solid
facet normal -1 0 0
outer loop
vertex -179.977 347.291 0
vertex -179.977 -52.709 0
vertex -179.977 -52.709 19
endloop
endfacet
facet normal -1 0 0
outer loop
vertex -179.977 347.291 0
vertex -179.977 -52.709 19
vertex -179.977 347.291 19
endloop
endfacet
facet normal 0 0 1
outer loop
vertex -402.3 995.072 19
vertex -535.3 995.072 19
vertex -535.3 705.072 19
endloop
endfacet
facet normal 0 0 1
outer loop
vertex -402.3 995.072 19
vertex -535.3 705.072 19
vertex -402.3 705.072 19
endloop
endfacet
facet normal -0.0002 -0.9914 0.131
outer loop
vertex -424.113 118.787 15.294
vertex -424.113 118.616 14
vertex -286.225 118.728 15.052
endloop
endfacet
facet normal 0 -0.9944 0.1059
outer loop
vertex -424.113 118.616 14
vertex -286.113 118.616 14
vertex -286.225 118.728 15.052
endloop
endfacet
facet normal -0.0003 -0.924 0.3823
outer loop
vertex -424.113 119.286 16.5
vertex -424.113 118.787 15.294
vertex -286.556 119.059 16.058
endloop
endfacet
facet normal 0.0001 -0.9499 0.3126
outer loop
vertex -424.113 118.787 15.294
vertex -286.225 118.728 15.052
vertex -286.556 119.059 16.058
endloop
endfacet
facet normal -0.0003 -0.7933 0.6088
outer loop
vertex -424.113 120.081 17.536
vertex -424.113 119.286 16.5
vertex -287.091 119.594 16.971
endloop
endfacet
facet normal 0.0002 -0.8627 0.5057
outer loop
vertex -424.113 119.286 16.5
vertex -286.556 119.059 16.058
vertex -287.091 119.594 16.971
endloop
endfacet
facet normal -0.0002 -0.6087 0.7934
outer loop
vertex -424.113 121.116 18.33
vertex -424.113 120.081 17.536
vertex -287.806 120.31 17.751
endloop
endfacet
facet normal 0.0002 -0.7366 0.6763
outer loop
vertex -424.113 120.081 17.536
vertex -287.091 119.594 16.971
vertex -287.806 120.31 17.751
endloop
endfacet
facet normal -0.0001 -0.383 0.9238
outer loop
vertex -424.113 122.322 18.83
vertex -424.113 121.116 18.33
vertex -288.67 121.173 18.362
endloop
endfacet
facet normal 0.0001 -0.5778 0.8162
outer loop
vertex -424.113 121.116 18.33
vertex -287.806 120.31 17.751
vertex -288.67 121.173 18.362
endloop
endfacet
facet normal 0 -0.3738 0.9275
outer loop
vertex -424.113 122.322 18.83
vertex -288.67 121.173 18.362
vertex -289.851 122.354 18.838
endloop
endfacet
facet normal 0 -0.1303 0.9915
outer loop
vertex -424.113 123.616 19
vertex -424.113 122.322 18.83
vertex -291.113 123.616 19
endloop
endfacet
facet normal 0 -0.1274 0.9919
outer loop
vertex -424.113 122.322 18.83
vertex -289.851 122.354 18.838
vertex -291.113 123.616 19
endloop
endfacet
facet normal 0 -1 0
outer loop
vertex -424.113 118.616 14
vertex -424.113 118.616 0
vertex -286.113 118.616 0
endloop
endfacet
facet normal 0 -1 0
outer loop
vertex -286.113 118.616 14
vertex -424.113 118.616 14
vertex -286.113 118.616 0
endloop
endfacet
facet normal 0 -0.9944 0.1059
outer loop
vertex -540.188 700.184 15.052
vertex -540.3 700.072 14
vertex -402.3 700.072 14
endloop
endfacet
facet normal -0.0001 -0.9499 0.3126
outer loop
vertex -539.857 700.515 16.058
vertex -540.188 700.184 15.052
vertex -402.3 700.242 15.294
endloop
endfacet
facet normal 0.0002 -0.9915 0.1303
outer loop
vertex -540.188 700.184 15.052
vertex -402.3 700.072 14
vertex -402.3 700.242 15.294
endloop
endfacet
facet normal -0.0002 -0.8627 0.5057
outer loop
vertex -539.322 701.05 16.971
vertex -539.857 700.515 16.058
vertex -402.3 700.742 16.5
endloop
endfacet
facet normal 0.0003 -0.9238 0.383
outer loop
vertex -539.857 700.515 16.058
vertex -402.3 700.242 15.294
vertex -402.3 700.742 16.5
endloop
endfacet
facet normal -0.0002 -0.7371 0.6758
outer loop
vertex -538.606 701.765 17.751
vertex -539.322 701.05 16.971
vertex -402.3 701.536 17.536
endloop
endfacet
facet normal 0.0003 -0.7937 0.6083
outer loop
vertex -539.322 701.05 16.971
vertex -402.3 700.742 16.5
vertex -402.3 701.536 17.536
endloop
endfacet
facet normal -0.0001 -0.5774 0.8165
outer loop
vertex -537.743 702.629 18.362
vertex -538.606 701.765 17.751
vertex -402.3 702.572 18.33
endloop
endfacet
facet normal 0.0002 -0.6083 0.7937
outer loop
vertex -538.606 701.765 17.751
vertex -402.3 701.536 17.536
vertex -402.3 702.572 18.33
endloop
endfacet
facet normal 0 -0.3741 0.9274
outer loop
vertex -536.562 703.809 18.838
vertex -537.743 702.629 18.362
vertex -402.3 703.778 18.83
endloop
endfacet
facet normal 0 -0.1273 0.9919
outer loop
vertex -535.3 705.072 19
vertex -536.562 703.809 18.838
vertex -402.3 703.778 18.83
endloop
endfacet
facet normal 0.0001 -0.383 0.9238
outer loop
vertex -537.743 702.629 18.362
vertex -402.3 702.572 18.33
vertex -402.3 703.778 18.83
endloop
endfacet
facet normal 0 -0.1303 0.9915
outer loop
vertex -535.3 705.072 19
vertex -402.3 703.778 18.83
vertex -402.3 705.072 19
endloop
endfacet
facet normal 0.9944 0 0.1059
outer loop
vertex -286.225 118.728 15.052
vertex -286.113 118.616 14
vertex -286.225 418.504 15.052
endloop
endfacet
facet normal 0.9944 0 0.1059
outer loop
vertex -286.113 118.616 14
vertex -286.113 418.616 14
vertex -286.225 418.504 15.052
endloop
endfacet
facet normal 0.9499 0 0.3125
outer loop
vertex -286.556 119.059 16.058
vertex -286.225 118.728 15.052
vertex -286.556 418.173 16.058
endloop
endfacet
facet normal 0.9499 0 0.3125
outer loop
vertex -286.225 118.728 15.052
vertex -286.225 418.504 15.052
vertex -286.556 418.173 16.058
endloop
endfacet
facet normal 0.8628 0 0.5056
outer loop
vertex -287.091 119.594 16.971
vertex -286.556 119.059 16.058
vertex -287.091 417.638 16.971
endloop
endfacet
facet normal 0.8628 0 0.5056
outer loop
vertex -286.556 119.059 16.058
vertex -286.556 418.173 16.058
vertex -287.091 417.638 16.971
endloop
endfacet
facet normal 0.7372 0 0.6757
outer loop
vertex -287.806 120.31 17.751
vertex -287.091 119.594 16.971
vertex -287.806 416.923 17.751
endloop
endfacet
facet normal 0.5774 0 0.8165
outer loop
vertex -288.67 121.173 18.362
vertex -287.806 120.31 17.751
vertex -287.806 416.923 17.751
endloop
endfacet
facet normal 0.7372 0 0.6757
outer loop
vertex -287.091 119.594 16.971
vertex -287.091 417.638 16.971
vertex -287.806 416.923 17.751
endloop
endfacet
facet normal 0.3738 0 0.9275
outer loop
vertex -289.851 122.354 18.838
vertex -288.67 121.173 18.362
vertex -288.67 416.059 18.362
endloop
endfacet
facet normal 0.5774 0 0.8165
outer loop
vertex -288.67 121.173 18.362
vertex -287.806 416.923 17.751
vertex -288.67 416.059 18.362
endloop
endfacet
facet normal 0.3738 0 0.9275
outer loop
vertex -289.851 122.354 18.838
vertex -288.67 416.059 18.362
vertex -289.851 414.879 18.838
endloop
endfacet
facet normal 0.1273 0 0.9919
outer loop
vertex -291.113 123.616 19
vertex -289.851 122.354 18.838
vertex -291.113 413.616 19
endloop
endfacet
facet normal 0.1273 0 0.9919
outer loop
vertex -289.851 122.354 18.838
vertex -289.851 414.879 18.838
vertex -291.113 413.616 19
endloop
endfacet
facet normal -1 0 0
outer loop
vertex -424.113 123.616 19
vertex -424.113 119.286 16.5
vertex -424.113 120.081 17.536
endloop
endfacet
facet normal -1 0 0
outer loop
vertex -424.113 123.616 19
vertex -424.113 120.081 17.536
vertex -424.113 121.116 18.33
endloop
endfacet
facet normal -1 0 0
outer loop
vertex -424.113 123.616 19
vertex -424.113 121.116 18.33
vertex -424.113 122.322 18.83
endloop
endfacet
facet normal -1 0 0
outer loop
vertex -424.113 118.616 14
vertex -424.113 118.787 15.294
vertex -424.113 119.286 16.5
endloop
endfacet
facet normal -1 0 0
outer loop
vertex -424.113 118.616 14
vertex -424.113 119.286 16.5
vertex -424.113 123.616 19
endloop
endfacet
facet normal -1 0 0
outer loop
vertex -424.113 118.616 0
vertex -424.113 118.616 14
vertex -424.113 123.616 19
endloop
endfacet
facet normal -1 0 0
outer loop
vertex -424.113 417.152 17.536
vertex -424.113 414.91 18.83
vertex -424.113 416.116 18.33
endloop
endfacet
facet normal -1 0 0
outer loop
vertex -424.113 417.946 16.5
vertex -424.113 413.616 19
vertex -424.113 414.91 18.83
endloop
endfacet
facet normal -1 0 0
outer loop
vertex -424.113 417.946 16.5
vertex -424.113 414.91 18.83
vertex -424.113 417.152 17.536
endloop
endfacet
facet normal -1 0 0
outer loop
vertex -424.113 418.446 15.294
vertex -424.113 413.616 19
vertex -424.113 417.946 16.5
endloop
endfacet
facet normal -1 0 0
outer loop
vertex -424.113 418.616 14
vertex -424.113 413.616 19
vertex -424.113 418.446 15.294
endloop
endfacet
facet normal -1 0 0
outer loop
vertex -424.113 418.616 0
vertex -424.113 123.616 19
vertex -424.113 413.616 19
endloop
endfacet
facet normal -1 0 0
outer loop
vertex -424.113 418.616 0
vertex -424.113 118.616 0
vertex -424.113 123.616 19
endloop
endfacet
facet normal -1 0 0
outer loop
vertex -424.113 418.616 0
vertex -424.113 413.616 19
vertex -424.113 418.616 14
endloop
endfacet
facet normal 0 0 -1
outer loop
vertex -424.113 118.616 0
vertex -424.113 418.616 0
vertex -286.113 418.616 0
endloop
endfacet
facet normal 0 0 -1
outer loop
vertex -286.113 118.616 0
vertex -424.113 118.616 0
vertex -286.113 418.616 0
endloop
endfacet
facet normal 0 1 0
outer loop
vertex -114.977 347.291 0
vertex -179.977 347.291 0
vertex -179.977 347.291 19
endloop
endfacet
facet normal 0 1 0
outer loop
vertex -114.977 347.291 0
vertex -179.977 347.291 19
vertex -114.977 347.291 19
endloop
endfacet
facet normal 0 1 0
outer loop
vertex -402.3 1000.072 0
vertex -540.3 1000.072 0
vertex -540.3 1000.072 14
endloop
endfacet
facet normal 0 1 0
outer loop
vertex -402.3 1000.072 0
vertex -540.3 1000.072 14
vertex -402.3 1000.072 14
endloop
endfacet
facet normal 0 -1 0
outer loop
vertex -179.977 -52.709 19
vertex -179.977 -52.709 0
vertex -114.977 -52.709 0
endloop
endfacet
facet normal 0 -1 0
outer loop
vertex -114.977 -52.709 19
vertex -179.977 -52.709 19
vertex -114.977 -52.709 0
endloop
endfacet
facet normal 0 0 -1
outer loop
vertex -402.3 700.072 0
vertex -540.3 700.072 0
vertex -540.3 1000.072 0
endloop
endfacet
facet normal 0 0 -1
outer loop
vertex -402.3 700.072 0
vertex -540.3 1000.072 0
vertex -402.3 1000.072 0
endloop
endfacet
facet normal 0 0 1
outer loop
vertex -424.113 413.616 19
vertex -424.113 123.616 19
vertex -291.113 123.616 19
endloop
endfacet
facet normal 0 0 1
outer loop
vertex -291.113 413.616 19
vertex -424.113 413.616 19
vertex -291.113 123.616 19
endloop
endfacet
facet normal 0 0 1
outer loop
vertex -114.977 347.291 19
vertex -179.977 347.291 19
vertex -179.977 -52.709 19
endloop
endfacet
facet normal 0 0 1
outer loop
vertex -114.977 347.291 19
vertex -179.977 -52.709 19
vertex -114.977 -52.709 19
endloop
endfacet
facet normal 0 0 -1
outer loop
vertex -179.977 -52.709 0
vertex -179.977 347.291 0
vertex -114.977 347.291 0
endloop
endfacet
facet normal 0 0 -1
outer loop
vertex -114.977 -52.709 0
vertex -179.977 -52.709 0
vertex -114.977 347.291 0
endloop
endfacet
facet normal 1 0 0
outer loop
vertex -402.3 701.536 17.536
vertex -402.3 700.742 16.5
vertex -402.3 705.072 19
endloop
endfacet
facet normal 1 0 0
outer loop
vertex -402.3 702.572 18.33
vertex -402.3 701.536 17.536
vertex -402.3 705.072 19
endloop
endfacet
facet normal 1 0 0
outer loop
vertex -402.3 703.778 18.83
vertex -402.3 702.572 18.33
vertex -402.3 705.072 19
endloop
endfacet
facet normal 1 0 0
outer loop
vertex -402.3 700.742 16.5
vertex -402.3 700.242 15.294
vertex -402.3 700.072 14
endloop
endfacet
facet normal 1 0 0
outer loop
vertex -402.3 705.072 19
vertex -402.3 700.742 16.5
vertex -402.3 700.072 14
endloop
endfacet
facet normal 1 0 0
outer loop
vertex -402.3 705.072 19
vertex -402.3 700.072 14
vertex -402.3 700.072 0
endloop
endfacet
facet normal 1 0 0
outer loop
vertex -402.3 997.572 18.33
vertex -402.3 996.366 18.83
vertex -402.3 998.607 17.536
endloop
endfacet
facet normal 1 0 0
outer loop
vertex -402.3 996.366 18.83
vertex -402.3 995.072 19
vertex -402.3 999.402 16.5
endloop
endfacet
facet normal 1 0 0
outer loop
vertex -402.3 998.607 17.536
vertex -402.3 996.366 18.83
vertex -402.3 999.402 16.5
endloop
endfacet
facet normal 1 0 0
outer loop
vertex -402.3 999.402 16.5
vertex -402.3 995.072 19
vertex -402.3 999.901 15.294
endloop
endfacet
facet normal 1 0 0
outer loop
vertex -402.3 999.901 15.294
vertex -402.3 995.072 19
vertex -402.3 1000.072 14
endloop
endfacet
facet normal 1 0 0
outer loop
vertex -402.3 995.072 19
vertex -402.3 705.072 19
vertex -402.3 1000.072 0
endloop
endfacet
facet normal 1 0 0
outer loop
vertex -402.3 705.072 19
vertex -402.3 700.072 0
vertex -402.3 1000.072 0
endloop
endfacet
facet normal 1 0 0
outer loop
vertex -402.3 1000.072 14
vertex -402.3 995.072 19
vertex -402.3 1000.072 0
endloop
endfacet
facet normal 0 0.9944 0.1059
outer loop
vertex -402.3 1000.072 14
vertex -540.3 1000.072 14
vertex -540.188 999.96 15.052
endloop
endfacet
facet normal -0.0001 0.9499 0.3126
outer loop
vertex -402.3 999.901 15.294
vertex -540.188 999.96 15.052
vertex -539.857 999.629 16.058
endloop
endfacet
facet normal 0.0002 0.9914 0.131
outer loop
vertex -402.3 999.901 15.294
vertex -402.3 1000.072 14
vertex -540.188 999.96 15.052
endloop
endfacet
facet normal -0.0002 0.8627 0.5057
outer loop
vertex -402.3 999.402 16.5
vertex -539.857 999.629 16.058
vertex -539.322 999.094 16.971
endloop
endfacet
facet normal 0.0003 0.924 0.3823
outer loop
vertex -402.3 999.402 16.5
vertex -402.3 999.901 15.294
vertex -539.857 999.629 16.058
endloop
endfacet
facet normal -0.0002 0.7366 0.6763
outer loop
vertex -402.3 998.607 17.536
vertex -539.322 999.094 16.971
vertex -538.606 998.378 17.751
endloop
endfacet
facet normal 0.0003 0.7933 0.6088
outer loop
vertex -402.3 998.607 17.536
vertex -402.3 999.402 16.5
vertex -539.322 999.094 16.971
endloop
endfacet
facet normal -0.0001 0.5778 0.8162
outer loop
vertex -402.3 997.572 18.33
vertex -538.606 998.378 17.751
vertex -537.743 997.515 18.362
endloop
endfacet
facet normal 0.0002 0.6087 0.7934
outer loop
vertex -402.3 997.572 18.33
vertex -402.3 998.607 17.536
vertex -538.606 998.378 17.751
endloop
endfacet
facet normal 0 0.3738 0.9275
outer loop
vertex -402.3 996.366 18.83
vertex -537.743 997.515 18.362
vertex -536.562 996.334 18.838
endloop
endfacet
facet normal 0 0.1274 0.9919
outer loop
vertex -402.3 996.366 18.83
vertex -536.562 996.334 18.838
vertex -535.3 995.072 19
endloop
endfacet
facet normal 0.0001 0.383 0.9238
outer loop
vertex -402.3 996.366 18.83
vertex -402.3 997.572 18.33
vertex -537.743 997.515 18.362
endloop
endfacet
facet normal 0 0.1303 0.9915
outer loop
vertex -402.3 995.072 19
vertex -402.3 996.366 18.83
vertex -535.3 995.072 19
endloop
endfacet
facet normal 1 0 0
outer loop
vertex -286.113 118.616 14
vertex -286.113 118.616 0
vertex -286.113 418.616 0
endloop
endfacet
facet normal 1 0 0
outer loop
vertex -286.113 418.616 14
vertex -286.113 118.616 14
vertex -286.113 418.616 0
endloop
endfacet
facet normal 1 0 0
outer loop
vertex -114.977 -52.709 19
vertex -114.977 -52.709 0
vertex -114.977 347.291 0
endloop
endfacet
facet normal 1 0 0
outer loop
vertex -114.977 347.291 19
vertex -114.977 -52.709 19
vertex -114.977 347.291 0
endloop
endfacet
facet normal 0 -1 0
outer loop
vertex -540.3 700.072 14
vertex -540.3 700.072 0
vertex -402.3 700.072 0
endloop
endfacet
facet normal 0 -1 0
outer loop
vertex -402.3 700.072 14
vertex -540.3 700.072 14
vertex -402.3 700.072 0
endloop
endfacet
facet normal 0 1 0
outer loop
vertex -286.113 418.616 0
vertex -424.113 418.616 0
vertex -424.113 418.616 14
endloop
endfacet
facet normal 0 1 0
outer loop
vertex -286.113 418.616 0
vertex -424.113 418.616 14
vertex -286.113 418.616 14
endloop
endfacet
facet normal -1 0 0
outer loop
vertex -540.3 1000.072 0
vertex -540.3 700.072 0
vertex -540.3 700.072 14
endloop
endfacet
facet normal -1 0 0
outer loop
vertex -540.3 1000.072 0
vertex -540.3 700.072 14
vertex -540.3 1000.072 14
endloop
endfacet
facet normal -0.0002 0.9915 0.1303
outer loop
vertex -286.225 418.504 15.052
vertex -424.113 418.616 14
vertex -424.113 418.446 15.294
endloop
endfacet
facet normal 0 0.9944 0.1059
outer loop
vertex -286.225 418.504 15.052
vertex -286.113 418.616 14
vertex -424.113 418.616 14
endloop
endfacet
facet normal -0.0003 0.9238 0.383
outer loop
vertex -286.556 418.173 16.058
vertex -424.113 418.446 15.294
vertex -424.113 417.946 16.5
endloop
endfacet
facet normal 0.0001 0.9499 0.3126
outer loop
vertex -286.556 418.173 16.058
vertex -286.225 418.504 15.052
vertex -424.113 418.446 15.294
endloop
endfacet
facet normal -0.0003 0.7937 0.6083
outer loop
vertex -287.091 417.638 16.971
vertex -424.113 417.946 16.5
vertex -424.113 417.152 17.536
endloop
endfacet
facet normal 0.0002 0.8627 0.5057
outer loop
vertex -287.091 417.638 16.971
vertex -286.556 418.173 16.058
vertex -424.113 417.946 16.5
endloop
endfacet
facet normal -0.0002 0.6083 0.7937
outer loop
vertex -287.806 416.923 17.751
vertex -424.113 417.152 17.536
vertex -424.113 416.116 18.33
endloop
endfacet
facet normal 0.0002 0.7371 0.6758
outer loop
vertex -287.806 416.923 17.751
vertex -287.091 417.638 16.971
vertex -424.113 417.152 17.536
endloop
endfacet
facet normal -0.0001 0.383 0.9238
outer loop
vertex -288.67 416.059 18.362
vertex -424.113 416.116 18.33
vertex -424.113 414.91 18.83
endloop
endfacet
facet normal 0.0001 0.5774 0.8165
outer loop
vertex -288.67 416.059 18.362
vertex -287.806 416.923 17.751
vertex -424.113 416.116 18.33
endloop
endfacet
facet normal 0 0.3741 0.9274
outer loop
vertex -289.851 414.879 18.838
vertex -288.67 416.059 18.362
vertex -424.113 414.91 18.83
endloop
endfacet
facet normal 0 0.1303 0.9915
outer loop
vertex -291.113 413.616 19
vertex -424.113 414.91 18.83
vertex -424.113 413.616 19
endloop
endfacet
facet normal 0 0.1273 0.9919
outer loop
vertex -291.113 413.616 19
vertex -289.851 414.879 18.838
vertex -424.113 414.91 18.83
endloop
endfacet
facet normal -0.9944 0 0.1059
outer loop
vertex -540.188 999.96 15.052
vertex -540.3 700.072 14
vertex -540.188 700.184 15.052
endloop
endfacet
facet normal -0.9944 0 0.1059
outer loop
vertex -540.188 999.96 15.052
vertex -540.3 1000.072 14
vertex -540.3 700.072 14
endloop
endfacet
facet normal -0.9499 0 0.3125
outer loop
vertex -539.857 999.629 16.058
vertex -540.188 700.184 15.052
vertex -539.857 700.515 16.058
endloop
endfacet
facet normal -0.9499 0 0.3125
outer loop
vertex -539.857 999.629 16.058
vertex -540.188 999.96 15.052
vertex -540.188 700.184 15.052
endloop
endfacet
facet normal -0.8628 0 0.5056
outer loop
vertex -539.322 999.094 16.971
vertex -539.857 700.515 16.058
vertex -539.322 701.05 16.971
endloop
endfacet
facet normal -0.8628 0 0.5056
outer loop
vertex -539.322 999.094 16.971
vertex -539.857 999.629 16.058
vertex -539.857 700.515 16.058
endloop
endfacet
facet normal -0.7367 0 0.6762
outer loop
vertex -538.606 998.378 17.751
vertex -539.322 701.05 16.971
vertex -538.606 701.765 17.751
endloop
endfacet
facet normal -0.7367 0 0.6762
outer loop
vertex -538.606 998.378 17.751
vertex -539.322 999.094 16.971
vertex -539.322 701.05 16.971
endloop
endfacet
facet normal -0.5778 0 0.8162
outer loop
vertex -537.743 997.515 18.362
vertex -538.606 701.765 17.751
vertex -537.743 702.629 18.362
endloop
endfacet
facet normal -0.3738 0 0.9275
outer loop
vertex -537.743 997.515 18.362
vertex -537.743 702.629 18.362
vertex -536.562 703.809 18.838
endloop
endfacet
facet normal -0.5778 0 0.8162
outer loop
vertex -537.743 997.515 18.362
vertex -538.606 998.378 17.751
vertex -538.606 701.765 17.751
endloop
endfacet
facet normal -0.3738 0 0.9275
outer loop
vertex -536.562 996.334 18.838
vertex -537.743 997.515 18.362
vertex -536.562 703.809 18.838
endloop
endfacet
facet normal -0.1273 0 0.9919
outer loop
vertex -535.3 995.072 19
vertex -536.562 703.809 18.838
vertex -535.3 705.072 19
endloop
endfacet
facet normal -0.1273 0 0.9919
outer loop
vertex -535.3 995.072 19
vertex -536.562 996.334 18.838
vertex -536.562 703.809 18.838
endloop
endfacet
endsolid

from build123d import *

# Parameters (mm, degrees)
F0_W     = 65
F0_H     = 400
F1_DEPTH = 19
F2_W     = 138
F2_H     = 300
F3_DEPTH = 19
F4_W     = 138
F4_H     = 300
F5_DEPTH = 19
F6_R     = 5
F6_2_R   = 5


with BuildPart() as f1:
    # F0 (on Top) → F1 (new body)
    with BuildSketch(Plane.XY):
        with Locations((-147.476863, 147.29089)):
            Rectangle(F0_W, F0_H)
    extrude(amount=F1_DEPTH)


with BuildPart() as f3:
    # F2 (on Top) → F3 (new body)
    with BuildSketch(Plane.XY):
        with Locations((-355.112985, 268.616241)):
            Rectangle(F2_W, F2_H)
    extrude(amount=F3_DEPTH)

    # F6#2
    f6_2_edges = [f3.edges().sort_by_distance(p)[0] for p in [
        (-355.112985, 418.616241, 19),
        (-286.112985, 268.616241, 19),
        (-355.112985, 118.616241, 19),
    ]]
    fillet(f6_2_edges, radius=F6_2_R)


with BuildPart() as f5:
    # F4 (on Top) → F5 (new body)
    with BuildSketch(Plane.XY):
        with Locations((-471.299738, 850.071842)):
            Rectangle(F4_W, F4_H)
    extrude(amount=F5_DEPTH)

    # F6
    f6_edges = [f5.edges().sort_by_distance(p)[0] for p in [
        (-540.299738, 850.071842, 19),
        (-471.299738, 700.071842, 19),
        (-471.299738, 1000.071842, 19),
    ]]
    fillet(f6_edges, radius=F6_R)


solid = Compound([f1.part, f3.part, f5.part])
